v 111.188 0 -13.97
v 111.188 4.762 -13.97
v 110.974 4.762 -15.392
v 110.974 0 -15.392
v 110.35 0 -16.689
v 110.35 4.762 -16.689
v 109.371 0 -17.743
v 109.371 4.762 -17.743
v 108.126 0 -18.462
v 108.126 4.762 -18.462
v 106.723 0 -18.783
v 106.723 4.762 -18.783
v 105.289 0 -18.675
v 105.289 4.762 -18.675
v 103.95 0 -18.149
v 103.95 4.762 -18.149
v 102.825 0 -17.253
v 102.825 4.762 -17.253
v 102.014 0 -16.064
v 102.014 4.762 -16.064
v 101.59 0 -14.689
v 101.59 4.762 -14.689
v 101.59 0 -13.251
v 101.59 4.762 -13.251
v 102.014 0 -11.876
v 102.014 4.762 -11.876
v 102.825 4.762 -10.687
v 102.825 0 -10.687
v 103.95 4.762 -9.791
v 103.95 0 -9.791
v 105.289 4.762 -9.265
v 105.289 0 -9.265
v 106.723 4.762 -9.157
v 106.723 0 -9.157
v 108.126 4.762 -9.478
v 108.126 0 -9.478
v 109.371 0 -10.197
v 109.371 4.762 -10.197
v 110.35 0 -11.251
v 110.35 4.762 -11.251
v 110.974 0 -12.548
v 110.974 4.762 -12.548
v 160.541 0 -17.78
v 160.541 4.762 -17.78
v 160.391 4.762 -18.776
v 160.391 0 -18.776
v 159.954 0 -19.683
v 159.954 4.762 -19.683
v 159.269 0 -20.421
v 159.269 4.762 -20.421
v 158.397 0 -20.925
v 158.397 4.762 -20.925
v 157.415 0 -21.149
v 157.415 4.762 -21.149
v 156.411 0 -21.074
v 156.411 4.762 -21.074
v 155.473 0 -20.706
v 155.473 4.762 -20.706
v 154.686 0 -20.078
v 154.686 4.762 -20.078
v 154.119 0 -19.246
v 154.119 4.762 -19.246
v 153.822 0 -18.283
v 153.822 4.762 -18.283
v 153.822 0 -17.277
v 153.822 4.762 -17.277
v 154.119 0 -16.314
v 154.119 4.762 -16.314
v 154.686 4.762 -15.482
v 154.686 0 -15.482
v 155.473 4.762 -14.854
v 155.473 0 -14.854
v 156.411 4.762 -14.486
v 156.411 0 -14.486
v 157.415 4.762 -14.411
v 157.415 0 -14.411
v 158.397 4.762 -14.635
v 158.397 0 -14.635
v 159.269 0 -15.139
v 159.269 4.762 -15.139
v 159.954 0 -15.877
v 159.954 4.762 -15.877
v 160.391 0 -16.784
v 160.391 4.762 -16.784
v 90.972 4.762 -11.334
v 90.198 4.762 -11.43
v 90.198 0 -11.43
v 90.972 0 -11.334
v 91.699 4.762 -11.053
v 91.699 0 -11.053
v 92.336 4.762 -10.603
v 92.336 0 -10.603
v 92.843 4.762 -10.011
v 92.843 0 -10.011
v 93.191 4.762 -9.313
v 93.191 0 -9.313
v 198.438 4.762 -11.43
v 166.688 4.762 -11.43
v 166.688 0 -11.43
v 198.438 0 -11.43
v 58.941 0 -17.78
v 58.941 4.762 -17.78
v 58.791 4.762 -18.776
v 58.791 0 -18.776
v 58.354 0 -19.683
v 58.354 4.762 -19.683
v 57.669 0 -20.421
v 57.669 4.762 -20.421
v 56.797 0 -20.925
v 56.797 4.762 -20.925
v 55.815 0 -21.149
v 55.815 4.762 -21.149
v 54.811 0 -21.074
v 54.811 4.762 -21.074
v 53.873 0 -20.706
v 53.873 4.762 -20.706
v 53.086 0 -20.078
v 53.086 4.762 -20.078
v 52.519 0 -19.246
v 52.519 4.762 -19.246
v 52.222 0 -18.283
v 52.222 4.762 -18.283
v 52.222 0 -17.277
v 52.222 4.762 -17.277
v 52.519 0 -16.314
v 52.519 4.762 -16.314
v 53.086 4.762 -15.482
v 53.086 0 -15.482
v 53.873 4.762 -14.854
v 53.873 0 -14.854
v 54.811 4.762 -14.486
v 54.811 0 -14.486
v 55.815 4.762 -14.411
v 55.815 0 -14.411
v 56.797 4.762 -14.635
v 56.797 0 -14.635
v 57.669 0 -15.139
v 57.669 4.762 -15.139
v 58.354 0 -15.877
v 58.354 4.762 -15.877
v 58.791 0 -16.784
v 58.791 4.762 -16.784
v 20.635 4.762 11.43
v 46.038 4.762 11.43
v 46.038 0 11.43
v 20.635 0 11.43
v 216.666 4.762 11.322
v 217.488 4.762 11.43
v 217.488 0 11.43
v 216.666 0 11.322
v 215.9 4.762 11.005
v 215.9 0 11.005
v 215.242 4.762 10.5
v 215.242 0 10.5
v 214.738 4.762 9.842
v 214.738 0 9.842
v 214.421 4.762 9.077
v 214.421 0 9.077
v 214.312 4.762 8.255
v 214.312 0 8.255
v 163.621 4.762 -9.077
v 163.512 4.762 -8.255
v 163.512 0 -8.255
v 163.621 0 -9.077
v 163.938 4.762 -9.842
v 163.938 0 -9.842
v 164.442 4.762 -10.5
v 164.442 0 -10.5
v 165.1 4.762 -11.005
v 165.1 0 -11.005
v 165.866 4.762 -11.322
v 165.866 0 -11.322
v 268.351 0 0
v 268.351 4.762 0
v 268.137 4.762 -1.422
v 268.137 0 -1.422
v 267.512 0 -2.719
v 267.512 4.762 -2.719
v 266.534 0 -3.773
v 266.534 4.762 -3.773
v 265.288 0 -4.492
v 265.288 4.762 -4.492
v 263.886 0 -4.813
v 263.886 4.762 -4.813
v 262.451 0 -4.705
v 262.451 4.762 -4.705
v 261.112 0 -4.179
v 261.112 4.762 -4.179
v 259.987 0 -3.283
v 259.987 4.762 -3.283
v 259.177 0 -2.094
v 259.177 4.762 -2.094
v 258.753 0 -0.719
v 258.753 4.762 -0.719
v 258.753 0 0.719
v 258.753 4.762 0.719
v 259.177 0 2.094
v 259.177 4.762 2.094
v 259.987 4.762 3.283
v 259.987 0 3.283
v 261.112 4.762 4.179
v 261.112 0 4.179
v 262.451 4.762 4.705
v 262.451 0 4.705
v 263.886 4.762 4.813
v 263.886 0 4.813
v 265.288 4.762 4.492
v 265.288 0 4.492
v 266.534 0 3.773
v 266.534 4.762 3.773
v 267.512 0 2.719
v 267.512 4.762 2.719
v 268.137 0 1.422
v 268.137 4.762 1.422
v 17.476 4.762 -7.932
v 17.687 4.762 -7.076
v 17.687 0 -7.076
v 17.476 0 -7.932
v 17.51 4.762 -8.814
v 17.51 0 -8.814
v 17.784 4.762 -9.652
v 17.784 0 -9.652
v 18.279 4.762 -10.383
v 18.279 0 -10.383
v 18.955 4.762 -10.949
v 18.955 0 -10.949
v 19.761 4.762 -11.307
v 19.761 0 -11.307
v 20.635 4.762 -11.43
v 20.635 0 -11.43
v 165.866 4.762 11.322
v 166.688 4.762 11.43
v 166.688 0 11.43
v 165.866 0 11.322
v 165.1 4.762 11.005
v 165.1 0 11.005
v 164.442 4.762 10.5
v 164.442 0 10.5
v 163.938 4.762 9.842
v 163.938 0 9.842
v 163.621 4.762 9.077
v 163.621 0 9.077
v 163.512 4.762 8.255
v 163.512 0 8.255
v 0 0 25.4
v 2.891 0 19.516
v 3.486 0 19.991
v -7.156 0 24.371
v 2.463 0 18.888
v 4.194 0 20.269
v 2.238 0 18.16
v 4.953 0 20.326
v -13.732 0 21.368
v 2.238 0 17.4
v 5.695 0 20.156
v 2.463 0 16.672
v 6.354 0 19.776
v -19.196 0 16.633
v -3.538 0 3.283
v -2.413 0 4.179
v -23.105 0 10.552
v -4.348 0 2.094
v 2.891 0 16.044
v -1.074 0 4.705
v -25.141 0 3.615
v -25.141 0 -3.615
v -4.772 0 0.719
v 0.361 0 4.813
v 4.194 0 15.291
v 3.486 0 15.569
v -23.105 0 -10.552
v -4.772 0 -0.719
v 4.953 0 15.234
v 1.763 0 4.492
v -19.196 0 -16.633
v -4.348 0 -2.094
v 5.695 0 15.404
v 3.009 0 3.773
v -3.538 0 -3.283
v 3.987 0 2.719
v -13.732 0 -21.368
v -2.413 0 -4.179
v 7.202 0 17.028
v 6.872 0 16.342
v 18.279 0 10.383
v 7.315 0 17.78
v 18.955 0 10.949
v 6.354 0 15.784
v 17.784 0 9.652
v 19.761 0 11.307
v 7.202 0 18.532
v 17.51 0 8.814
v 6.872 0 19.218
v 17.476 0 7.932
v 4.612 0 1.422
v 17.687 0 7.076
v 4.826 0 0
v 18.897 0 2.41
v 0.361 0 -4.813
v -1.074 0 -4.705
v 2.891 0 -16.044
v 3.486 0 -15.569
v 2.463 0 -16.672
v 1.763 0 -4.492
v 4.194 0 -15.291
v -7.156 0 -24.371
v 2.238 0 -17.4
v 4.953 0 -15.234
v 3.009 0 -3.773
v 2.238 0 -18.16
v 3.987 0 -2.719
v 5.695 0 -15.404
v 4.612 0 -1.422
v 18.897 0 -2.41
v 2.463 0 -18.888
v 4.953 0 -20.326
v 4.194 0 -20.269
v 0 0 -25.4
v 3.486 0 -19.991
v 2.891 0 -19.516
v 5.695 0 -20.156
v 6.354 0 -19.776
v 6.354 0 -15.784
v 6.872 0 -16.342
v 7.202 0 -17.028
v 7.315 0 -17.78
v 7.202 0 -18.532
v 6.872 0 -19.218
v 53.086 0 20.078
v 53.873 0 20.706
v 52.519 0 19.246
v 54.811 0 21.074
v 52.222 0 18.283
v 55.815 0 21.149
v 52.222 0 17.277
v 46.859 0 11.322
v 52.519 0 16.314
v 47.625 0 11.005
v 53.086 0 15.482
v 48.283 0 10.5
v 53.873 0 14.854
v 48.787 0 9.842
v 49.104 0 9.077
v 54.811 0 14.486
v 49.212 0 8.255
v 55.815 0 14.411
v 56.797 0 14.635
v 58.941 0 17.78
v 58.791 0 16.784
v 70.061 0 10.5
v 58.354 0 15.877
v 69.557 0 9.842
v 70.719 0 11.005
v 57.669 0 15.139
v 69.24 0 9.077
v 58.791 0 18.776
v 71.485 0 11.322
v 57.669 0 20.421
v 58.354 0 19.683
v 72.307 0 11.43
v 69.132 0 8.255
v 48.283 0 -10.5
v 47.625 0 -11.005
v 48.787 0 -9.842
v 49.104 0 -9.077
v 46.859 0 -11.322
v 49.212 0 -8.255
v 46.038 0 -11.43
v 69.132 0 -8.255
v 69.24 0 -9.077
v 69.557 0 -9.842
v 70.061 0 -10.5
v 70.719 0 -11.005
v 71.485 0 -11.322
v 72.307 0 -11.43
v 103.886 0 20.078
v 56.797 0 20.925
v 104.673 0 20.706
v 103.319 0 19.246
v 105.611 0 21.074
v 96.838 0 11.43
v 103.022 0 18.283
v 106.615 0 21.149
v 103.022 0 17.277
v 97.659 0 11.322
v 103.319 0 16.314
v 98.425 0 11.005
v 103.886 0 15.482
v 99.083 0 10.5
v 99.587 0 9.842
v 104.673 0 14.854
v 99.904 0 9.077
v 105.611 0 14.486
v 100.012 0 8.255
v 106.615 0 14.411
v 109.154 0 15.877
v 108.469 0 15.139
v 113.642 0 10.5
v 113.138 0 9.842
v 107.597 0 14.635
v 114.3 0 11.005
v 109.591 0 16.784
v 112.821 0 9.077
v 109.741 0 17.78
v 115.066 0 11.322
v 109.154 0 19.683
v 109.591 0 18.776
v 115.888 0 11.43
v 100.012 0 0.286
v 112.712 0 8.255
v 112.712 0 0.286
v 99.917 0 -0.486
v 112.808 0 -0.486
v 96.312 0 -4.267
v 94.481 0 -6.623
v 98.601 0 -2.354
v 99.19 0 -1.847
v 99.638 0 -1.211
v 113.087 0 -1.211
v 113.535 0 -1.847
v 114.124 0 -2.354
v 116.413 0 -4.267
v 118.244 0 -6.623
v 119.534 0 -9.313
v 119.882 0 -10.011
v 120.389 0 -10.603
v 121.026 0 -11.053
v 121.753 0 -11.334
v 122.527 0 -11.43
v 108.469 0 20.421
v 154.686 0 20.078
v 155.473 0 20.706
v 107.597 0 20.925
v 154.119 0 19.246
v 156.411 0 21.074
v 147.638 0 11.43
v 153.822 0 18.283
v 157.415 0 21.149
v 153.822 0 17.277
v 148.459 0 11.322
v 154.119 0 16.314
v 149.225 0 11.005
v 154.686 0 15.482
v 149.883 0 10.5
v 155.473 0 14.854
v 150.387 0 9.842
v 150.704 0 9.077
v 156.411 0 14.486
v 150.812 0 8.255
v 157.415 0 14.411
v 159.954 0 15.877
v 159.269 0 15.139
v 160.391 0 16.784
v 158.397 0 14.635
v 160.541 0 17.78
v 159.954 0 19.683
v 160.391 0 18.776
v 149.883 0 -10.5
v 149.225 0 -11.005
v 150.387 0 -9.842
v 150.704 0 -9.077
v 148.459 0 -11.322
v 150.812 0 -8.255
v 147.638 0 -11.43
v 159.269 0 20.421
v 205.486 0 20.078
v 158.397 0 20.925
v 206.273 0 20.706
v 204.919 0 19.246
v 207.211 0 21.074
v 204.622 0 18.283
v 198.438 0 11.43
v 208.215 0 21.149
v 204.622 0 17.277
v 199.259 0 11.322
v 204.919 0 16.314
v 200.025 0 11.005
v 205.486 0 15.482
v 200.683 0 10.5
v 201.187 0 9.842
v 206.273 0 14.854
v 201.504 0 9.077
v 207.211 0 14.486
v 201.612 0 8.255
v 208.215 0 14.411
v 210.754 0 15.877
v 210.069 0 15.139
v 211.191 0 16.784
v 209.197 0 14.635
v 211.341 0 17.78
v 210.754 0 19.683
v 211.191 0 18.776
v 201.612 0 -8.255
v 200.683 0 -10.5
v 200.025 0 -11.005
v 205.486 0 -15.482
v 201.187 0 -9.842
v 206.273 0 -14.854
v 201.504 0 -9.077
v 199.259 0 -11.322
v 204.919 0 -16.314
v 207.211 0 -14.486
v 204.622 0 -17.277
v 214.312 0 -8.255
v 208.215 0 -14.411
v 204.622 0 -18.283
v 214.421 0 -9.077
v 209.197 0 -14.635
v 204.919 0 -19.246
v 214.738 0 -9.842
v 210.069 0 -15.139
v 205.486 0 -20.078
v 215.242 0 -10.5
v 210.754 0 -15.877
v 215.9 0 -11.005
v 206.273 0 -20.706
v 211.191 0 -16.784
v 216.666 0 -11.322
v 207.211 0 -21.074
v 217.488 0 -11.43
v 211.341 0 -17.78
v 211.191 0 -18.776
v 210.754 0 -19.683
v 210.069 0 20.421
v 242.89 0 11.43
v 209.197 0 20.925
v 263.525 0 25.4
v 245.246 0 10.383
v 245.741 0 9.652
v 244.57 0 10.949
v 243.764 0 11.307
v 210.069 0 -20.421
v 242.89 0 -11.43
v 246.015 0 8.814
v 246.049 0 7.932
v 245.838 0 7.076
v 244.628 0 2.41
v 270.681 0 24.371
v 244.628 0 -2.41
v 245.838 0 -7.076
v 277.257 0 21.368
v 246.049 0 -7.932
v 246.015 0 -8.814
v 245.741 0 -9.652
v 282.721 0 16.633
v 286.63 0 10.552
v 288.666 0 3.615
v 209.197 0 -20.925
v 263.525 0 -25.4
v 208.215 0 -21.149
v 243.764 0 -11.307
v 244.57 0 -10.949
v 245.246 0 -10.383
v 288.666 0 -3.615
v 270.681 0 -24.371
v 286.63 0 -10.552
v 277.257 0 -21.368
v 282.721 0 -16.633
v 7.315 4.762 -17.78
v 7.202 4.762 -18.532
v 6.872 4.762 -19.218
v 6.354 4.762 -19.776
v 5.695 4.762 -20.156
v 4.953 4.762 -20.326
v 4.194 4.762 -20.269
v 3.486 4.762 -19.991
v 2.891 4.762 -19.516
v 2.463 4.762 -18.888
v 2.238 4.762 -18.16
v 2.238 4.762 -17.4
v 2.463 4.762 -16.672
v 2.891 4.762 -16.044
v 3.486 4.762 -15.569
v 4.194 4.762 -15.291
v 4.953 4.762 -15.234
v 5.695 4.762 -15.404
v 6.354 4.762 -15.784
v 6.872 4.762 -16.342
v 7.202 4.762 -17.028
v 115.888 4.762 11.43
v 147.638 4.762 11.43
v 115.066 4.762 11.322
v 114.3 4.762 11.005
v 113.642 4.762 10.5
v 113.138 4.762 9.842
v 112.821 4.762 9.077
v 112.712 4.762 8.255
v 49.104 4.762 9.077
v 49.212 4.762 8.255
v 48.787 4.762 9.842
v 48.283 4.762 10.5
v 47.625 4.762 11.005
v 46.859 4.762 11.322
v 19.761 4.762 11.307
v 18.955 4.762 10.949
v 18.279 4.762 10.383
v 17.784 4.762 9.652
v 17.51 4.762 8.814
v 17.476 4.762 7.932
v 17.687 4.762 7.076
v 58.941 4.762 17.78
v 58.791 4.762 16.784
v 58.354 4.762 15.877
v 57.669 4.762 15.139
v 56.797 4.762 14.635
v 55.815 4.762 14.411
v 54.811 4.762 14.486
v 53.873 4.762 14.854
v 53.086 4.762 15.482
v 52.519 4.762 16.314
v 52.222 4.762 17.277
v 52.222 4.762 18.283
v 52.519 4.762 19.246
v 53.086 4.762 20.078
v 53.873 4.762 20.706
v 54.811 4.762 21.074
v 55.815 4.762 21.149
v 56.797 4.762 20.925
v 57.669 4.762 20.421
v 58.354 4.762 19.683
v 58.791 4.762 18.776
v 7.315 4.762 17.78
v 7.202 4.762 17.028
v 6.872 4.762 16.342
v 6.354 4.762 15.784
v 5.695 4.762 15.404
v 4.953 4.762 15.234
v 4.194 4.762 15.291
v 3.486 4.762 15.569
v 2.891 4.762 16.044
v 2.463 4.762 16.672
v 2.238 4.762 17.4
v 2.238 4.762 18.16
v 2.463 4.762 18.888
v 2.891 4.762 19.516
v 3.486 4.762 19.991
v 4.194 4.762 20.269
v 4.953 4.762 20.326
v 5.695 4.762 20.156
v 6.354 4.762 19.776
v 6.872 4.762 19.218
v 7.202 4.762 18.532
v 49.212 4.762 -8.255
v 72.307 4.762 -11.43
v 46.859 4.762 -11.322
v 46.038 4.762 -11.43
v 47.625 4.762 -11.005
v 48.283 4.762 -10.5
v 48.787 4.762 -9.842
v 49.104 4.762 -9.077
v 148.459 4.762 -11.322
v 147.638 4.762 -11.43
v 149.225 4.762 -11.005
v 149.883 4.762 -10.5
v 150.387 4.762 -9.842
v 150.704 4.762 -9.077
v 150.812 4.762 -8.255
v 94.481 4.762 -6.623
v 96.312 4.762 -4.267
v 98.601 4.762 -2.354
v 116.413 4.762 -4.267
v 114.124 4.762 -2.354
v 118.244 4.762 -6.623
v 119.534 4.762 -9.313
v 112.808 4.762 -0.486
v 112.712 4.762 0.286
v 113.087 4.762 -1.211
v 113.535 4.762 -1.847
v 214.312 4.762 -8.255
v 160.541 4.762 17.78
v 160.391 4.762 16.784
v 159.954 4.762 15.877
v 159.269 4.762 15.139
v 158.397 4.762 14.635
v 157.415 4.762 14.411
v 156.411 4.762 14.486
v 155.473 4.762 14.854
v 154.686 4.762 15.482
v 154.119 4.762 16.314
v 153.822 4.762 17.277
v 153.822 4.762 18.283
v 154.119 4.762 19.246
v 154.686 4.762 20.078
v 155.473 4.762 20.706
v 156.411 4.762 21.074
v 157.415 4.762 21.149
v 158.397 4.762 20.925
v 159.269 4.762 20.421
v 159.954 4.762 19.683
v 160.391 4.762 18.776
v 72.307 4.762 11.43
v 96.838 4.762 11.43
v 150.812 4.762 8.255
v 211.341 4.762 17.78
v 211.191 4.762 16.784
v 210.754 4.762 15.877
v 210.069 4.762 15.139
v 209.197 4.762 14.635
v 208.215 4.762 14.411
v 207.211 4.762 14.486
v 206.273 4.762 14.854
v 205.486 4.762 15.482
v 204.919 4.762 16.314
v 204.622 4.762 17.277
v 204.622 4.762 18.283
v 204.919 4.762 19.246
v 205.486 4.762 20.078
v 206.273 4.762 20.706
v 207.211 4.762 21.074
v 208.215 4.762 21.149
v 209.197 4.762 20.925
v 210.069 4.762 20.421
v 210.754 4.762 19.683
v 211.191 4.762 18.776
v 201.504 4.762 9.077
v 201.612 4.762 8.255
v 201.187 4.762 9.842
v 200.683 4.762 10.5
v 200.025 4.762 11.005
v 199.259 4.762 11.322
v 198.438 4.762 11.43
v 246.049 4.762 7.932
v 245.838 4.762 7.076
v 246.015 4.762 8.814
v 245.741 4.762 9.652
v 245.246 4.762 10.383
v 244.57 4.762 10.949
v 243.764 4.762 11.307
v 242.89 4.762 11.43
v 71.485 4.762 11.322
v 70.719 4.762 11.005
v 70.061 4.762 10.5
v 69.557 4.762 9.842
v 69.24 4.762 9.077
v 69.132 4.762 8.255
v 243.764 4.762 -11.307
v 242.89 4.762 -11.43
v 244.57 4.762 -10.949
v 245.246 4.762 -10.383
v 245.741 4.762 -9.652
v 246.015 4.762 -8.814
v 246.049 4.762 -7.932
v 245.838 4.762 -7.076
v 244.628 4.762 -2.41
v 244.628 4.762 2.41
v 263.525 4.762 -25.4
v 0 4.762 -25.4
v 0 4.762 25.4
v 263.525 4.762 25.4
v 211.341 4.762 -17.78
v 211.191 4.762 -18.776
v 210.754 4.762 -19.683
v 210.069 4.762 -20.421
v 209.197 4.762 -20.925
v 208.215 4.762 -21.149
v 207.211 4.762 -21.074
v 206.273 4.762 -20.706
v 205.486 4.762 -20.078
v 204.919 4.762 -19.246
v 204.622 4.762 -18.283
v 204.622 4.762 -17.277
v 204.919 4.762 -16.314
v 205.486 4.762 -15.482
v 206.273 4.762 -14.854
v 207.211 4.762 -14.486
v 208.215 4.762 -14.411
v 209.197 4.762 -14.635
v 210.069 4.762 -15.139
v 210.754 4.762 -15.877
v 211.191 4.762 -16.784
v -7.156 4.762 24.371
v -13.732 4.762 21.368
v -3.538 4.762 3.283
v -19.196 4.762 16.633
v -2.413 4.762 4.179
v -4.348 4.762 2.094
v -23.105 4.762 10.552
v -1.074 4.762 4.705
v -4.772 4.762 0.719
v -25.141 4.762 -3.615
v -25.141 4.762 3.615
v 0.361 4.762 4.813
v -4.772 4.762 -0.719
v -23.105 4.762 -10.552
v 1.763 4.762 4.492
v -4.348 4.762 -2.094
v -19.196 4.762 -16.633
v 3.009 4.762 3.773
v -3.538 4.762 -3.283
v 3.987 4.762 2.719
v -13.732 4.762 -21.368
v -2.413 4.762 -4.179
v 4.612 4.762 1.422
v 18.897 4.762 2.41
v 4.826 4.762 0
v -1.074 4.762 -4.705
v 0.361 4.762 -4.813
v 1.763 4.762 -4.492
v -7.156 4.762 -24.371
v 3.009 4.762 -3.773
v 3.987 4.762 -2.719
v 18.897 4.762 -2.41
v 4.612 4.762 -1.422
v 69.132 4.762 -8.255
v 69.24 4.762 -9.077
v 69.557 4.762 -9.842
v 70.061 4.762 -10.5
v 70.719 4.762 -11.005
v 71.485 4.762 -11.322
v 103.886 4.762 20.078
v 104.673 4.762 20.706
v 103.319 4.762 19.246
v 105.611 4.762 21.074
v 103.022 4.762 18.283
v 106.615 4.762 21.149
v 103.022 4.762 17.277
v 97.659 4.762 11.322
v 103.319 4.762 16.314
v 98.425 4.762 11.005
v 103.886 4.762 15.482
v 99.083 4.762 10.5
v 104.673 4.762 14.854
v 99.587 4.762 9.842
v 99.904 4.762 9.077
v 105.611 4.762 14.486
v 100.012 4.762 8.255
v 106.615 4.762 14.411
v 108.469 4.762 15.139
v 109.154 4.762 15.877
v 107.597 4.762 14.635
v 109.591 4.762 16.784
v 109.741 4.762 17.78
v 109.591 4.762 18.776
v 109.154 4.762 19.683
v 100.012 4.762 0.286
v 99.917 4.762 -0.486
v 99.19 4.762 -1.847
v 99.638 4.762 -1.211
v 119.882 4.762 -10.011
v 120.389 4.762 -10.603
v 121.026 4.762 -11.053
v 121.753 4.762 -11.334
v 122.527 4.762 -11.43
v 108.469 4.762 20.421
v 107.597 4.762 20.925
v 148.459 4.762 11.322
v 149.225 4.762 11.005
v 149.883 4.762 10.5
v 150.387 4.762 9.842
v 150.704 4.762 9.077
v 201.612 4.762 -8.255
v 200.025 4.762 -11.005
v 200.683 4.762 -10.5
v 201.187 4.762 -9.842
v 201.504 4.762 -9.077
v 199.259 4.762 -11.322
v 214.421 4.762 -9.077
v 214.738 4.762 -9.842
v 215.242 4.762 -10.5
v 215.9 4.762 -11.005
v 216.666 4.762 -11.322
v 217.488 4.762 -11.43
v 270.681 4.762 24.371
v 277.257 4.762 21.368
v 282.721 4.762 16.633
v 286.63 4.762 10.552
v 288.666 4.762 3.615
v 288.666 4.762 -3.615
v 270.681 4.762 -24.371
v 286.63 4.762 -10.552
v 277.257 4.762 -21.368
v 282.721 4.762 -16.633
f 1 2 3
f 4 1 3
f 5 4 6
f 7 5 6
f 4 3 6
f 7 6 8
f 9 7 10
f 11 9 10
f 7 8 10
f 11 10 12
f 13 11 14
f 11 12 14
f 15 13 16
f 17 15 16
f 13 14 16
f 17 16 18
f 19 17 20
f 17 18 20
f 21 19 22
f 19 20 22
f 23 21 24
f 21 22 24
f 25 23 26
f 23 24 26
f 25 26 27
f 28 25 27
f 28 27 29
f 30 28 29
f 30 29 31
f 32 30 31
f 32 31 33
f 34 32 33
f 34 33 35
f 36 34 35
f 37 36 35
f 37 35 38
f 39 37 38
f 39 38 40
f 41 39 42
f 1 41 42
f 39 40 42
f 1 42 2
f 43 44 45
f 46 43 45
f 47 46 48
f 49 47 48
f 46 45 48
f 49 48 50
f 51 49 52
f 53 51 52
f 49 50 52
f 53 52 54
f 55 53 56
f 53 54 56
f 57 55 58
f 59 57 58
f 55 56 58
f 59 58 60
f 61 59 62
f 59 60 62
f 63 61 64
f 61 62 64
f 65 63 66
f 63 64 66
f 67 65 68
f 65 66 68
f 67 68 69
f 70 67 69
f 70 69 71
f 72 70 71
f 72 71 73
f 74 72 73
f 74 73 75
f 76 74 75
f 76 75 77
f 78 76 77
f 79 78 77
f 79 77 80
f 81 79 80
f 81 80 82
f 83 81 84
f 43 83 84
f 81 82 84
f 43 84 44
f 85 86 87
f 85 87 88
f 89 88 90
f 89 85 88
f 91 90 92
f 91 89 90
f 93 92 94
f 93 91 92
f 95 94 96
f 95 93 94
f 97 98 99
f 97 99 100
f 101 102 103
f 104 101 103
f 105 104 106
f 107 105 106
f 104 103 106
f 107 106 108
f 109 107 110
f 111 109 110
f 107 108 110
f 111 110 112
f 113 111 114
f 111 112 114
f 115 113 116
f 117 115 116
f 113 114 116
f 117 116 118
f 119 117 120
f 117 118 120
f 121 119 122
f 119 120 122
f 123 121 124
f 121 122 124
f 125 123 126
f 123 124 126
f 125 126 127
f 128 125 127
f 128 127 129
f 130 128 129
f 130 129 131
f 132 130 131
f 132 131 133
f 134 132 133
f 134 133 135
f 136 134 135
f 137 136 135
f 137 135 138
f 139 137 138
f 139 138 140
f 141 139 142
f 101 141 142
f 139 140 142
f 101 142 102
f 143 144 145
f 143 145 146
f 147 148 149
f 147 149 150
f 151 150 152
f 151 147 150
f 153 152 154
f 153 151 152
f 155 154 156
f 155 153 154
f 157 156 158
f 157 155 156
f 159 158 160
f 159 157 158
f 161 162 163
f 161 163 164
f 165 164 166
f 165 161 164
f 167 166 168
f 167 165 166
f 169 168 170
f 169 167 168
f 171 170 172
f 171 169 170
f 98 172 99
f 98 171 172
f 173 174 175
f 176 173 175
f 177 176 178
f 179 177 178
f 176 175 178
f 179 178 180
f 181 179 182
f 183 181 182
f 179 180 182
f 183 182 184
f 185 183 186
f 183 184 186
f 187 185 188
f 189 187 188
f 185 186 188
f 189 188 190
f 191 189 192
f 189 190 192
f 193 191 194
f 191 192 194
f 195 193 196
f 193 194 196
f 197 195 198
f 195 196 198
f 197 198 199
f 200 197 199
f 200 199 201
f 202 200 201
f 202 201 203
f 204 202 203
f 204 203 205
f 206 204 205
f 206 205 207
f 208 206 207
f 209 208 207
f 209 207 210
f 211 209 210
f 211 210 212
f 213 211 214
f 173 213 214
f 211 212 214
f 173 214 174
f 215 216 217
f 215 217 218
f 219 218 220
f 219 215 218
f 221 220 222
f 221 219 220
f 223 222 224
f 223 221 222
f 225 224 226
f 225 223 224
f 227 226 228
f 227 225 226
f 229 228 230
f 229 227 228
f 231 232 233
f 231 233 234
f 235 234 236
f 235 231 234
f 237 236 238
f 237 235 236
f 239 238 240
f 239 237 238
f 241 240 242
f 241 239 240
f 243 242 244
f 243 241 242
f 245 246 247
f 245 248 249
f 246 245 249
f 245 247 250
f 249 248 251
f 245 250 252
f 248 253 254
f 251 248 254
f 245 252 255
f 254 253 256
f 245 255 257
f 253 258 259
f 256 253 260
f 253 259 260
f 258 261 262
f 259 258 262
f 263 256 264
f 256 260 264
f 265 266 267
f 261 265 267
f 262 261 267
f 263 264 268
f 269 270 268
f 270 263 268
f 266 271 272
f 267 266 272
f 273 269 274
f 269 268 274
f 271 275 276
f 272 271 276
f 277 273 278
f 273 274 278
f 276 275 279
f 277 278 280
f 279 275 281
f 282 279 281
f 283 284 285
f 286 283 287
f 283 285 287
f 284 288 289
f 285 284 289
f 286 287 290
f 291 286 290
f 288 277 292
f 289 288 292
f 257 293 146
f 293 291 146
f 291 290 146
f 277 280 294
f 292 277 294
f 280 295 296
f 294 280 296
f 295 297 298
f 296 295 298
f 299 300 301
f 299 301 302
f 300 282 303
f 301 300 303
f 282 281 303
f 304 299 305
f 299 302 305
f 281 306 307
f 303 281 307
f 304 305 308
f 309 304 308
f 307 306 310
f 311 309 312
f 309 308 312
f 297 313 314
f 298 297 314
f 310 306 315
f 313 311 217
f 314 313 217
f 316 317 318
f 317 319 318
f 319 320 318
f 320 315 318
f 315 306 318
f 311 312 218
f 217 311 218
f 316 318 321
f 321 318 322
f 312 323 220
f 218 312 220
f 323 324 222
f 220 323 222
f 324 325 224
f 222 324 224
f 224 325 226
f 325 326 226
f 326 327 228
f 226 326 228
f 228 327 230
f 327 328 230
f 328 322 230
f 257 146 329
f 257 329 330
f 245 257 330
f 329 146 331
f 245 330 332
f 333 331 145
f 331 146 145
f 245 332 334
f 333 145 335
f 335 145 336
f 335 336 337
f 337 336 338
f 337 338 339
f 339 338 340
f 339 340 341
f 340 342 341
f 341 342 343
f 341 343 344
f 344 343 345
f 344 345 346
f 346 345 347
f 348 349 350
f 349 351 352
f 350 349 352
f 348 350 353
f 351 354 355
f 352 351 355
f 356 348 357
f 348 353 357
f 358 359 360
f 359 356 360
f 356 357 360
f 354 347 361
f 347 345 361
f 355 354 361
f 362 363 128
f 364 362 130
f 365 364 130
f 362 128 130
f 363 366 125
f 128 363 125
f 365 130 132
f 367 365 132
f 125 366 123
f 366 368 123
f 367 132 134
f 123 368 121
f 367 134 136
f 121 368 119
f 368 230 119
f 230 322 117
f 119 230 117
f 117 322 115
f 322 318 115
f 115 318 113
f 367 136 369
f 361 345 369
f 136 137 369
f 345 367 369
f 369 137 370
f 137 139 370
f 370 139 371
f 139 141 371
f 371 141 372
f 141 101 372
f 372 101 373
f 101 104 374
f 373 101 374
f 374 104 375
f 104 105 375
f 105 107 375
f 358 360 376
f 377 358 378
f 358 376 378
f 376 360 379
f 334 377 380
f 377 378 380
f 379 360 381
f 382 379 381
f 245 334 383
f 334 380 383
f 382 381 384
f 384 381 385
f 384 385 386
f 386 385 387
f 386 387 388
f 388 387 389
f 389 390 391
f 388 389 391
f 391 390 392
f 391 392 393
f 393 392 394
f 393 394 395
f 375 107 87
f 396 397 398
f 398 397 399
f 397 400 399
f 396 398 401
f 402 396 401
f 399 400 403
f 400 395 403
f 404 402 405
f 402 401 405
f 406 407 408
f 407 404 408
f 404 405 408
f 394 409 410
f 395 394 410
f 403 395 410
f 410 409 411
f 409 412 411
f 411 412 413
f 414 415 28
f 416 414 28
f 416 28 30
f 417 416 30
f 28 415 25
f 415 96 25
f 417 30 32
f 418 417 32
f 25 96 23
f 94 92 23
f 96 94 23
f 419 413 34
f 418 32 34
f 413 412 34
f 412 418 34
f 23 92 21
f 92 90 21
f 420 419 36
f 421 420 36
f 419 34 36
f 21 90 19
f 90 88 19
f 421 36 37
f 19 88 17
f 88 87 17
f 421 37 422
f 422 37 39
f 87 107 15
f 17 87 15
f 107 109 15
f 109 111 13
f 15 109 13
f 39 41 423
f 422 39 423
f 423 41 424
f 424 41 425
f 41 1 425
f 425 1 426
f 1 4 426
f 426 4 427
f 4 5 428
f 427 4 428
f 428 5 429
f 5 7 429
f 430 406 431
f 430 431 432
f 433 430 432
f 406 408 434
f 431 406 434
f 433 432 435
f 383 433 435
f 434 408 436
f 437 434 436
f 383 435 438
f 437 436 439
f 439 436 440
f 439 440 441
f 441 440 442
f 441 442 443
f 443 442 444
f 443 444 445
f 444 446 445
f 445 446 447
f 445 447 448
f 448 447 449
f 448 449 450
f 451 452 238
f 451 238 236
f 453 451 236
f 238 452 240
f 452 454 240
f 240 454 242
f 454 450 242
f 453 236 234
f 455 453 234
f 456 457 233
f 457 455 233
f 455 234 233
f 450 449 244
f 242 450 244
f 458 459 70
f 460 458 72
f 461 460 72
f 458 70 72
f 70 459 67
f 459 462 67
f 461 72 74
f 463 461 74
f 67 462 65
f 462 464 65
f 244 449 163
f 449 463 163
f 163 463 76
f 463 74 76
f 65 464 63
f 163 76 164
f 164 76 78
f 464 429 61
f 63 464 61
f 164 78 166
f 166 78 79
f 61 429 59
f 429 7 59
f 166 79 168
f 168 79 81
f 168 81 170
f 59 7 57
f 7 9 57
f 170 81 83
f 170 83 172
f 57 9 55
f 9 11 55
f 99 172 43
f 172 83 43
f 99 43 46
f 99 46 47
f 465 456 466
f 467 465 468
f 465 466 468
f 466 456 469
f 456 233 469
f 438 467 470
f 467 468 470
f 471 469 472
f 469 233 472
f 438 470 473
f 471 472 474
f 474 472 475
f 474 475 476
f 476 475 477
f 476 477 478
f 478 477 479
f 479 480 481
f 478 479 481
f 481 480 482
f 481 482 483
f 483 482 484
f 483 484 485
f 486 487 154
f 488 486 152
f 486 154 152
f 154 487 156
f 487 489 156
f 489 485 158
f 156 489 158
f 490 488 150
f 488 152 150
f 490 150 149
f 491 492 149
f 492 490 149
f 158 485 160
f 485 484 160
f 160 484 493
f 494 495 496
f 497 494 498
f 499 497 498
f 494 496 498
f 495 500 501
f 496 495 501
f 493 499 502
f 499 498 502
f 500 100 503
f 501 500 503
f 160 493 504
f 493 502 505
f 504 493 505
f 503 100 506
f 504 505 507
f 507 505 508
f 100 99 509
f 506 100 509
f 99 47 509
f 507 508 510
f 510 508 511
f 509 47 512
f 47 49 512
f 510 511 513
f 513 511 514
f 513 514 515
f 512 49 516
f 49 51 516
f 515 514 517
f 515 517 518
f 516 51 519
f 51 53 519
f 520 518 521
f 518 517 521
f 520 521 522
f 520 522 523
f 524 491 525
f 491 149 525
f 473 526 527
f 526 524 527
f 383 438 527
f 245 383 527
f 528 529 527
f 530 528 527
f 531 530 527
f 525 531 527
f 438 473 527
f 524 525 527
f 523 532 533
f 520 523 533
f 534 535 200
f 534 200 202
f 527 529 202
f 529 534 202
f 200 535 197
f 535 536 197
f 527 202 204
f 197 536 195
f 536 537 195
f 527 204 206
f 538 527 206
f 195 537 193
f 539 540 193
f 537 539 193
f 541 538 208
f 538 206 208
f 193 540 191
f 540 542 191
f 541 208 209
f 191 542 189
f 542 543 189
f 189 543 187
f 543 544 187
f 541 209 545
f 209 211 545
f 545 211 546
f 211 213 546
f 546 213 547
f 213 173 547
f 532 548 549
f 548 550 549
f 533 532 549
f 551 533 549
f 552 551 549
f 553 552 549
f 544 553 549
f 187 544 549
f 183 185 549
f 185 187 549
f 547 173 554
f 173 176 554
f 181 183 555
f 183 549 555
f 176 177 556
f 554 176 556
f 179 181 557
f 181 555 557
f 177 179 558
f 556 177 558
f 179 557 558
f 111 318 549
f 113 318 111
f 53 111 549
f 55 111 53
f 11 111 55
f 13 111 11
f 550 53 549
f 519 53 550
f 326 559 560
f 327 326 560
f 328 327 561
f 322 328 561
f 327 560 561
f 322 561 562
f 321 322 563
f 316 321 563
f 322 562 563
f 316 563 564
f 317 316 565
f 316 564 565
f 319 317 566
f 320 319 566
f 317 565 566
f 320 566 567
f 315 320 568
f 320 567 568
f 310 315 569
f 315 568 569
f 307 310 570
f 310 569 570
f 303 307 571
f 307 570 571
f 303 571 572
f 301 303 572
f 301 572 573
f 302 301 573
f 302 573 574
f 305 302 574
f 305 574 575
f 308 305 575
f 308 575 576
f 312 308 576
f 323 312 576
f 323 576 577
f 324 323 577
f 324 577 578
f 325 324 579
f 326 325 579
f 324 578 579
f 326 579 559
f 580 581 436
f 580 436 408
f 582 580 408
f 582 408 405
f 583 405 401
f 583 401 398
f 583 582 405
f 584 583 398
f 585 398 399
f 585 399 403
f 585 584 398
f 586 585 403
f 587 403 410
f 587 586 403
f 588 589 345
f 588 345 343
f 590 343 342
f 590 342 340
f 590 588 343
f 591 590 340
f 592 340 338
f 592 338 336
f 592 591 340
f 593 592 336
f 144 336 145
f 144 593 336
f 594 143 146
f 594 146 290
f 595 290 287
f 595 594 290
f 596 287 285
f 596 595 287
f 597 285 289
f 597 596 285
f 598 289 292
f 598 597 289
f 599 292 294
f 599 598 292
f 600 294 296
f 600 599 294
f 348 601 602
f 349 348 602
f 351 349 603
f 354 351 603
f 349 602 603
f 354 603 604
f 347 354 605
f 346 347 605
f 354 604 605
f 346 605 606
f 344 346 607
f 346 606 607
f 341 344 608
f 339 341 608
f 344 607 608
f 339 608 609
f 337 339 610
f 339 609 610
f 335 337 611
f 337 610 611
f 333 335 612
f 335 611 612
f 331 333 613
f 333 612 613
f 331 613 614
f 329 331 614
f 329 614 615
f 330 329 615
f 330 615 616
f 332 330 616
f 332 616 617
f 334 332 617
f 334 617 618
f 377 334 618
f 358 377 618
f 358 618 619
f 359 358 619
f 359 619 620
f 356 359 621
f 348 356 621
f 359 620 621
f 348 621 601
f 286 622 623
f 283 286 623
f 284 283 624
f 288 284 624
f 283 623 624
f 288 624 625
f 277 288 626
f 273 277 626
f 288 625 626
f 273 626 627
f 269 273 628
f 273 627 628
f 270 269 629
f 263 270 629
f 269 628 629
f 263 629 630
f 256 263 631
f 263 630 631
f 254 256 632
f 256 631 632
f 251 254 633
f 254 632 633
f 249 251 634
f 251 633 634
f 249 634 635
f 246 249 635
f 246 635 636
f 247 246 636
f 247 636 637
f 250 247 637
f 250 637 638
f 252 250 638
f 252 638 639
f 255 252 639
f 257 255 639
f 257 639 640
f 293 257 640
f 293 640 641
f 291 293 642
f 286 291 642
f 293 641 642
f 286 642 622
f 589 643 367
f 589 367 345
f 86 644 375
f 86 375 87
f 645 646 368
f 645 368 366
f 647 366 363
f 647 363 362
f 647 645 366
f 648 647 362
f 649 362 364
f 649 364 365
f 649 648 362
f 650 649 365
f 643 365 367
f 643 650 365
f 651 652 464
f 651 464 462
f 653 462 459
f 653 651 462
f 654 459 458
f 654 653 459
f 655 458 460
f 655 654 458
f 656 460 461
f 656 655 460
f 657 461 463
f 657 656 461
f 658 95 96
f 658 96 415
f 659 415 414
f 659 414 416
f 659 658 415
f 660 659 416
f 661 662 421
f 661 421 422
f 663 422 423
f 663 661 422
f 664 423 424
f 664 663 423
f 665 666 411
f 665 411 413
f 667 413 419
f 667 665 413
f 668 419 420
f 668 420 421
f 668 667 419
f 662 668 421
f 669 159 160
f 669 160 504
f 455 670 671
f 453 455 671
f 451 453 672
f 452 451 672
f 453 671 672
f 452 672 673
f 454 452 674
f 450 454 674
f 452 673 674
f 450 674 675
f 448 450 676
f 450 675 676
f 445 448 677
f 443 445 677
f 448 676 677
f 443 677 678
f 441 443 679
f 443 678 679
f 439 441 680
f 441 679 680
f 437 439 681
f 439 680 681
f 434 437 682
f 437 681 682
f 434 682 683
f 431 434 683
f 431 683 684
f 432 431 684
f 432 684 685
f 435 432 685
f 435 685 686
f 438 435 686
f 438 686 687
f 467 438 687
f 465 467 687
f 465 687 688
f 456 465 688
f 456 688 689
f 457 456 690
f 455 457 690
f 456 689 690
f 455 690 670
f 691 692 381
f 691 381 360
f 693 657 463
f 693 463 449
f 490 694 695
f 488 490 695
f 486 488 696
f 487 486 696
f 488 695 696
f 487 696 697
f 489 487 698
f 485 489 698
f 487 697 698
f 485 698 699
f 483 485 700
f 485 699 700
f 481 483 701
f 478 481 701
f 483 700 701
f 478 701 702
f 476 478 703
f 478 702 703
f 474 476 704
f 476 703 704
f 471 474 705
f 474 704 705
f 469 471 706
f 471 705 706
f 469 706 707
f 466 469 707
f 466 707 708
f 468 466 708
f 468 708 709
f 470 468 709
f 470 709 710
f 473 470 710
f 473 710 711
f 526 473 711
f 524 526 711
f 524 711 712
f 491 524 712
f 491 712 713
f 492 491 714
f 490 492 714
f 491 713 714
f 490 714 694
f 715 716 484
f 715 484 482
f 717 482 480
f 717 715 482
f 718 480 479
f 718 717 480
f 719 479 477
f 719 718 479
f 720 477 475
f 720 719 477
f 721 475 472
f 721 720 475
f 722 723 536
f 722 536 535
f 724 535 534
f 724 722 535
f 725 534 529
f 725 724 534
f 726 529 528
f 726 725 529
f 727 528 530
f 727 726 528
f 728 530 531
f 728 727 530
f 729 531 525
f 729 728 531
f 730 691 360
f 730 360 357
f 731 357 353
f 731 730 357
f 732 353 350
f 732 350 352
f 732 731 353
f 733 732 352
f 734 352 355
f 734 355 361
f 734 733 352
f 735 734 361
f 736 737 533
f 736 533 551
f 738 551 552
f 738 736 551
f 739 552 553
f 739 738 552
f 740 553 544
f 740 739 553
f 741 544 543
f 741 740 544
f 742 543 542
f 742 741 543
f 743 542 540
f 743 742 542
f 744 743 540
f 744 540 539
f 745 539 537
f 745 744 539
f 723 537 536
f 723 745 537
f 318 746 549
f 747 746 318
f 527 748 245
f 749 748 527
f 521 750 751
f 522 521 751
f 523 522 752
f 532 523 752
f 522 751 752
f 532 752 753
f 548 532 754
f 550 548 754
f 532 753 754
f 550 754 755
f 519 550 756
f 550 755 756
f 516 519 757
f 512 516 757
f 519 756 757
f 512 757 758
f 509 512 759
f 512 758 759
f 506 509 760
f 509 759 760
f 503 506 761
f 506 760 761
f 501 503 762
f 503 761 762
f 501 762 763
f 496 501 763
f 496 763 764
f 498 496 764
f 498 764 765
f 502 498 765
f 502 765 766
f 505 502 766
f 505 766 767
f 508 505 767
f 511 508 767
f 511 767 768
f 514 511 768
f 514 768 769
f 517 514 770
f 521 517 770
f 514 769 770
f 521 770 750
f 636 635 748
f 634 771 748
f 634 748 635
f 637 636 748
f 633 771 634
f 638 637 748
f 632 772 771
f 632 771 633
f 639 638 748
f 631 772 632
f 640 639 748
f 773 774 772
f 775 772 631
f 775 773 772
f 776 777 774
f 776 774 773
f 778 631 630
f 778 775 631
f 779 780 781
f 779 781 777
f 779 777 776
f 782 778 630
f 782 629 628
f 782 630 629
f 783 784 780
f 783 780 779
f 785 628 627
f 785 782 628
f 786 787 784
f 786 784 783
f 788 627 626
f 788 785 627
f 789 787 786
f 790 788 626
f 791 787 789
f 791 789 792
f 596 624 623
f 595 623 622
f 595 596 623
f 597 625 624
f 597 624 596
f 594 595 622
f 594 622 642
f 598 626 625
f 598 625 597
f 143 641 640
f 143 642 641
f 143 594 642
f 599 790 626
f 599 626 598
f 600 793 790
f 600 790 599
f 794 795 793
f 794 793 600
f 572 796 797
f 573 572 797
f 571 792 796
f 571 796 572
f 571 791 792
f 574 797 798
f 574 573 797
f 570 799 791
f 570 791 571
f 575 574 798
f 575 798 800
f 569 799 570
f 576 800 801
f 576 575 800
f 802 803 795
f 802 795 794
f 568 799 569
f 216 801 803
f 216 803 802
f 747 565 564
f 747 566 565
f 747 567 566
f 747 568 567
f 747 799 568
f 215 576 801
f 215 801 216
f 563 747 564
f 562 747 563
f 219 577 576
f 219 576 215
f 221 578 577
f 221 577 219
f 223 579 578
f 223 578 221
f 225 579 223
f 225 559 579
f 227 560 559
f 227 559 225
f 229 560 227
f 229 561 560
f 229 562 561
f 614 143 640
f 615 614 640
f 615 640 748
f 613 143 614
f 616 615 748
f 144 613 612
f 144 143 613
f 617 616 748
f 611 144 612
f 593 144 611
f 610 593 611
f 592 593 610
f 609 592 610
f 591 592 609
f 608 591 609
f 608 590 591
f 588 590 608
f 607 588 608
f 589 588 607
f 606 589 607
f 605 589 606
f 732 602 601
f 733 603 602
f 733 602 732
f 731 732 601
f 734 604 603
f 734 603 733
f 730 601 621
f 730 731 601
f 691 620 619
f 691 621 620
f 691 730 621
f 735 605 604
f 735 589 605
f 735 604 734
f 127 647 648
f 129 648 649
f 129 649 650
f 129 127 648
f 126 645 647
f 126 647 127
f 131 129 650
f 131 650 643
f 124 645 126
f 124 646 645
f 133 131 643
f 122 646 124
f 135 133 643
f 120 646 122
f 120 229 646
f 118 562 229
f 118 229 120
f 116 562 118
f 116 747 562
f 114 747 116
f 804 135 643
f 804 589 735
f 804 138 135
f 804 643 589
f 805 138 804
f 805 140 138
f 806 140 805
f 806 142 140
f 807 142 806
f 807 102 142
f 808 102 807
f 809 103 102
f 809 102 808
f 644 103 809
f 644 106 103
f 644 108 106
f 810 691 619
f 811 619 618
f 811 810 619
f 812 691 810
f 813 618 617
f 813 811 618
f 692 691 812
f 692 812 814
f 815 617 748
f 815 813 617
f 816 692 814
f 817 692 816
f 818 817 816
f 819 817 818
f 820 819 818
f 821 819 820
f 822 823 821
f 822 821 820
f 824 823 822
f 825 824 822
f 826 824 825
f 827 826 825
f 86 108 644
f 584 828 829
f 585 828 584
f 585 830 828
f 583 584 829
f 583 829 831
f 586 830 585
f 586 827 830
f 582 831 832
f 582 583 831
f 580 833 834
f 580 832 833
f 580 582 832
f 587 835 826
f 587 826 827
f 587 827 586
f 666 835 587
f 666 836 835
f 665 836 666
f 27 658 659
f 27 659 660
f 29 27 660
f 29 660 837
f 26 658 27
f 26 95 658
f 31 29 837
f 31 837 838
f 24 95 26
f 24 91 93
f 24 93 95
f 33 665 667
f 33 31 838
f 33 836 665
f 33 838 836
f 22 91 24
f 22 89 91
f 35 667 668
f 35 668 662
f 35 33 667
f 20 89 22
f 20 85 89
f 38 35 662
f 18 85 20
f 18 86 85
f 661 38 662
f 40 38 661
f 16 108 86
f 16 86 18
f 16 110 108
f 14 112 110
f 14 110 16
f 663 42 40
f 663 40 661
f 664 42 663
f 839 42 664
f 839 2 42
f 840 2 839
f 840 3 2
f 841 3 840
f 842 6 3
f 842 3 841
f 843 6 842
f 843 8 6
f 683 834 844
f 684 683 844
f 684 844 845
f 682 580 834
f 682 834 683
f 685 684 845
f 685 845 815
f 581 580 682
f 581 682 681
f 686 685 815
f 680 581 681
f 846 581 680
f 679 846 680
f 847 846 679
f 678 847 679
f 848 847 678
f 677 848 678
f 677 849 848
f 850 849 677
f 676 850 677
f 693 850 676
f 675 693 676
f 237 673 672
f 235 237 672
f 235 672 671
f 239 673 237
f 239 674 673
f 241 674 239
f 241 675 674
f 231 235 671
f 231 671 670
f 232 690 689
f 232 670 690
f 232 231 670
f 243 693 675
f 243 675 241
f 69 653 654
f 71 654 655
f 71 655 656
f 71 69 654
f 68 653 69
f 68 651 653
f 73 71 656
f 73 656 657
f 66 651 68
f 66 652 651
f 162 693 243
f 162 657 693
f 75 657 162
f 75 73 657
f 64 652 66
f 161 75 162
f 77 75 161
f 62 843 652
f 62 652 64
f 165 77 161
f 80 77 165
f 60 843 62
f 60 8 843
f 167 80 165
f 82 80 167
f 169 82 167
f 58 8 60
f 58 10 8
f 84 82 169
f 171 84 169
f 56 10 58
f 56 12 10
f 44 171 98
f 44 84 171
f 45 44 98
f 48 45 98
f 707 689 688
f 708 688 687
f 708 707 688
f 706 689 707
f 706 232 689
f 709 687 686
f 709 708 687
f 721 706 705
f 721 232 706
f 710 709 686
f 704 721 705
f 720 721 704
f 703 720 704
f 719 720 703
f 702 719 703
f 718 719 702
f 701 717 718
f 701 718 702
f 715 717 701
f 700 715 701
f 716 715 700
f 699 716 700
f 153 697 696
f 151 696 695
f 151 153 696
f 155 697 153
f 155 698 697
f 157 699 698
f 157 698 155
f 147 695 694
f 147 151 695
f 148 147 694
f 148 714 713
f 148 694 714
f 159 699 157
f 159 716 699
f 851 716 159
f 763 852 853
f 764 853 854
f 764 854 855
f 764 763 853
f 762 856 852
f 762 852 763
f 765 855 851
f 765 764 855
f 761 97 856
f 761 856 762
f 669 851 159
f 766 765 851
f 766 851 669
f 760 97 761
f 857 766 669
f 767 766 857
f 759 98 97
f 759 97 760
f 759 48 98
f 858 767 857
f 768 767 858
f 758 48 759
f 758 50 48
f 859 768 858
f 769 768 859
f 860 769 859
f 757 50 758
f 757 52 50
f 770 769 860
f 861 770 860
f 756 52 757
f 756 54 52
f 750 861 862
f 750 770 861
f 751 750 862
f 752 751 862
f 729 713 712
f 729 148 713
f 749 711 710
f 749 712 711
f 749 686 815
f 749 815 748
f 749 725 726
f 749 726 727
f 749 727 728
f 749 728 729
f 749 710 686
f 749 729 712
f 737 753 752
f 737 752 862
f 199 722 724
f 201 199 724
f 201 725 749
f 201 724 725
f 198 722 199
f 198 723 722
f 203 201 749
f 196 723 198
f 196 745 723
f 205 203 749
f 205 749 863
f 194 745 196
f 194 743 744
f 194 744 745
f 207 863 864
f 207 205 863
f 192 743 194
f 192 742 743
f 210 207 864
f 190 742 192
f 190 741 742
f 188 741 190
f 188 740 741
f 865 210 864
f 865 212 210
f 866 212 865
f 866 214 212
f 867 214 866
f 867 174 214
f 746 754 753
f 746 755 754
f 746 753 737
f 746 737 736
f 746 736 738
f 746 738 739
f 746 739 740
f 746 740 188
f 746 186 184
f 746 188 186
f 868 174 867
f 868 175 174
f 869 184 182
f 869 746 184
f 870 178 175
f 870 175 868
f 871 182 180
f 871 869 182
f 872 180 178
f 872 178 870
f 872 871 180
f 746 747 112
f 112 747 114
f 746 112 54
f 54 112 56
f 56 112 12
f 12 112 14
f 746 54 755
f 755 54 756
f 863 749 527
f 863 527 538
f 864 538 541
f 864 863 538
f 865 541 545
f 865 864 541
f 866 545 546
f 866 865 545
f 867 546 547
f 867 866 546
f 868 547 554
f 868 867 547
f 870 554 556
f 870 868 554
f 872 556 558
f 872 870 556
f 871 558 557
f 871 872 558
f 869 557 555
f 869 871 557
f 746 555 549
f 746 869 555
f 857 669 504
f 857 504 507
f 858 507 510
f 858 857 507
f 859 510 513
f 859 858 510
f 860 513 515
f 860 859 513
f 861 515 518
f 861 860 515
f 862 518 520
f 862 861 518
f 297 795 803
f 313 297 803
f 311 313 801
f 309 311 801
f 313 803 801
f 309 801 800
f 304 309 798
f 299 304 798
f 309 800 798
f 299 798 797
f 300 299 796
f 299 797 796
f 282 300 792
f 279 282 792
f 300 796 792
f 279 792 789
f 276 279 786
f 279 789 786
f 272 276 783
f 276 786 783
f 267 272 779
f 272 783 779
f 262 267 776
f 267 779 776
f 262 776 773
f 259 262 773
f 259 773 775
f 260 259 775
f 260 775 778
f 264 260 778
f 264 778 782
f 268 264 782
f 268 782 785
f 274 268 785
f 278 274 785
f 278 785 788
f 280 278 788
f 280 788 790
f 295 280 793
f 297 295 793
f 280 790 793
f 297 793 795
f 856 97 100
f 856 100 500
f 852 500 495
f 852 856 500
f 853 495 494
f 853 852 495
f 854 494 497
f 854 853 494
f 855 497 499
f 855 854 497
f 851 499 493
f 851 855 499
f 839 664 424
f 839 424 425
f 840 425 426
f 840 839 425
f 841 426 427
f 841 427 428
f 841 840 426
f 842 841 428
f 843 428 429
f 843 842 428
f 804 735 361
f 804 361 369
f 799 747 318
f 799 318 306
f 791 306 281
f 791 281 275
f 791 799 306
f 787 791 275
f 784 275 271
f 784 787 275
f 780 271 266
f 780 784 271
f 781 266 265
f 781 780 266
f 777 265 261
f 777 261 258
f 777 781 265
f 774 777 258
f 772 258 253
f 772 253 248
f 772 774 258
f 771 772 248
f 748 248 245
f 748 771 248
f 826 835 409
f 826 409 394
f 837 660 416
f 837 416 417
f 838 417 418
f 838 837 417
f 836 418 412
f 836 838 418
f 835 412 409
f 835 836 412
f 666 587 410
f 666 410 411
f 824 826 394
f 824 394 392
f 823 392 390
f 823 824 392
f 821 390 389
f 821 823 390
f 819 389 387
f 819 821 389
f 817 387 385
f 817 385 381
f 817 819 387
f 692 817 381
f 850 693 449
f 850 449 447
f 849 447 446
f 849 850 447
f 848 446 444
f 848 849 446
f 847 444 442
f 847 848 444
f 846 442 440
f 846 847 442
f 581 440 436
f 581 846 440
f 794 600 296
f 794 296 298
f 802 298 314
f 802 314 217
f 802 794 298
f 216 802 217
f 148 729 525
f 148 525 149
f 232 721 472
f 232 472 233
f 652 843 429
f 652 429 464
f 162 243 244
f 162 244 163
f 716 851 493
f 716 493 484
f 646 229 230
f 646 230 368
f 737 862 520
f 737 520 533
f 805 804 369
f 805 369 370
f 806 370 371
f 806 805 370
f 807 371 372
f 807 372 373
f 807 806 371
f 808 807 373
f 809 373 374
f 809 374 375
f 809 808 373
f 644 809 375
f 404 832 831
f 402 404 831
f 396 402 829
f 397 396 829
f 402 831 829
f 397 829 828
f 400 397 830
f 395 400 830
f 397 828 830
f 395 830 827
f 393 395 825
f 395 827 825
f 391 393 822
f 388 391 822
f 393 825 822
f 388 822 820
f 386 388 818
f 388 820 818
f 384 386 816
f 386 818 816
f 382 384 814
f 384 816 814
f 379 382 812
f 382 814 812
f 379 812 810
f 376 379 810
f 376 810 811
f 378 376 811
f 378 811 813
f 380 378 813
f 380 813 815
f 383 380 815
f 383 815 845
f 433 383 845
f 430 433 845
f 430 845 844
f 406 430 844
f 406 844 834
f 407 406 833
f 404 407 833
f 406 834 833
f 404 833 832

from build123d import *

# Parameters (mm, degrees)
SKETCH1_R           = 4.826
SKETCH1_R_2         = 3.3782
SKETCH1_R_3         = 2.5527
BOSS_EXTRUDE1_DEPTH = 4.7625


with BuildPart() as part:
    # Sketch1 → Boss-Extrude1 (new body)
    with BuildSketch(Plane(origin=(0, 4.7625, 0), x_dir=(1, 0, 0), z_dir=(0, 1, 0))):
        with BuildLine():
            Line((263.525, 25.4), (0, 25.4))
            ThreePointArc((0, 25.4), (-25.4, 0), (0, -25.4))
            Line((0, -25.4), (263.525, -25.4))
            ThreePointArc((263.525, -25.4), (288.925, 0), (263.525, 25.4))
        make_face()
        Circle(SKETCH1_R, mode=Mode.SUBTRACT)
        with Locations((263.525, 0)):
            Circle(SKETCH1_R, mode=Mode.SUBTRACT)
        with Locations((55.5625, -17.78)):
            Circle(SKETCH1_R_2, mode=Mode.SUBTRACT)
        with Locations((4.7625, -17.78)):
            Circle(SKETCH1_R_3, mode=Mode.SUBTRACT)
        with Locations((207.9625, 17.78)):
            Circle(SKETCH1_R_2, mode=Mode.SUBTRACT)
        with Locations((106.3625, -17.78)):
            Circle(SKETCH1_R_2, mode=Mode.SUBTRACT)
        with Locations((157.1625, -17.78)):
            Circle(SKETCH1_R_2, mode=Mode.SUBTRACT)
        with Locations((207.9625, -17.78)):
            Circle(SKETCH1_R_2, mode=Mode.SUBTRACT)
        with Locations((157.1625, 17.78)):
            Circle(SKETCH1_R_2, mode=Mode.SUBTRACT)
        with Locations((4.7625, 17.78)):
            Circle(SKETCH1_R_3, mode=Mode.SUBTRACT)
        with Locations((55.5625, 17.78)):
            Circle(SKETCH1_R_2, mode=Mode.SUBTRACT)
        with Locations((106.3625, 13.97)):
            Circle(SKETCH1_R, mode=Mode.SUBTRACT)
        with BuildLine():
            Line((166.6875, 11.43), (198.4375, 11.43))
            ThreePointArc((198.4375, 11.43), (200.68256403, 10.50006403), (201.6125, 8.255))
            Line((201.6125, 8.255), (201.6125, -8.255))
            ThreePointArc((201.6125, -8.255), (200.68256403, -10.50006403), (198.4375, -11.43))
            Line((198.4375, -11.43), (166.6875, -11.43))
            ThreePointArc((166.6875, -11.43), (164.44243597, -10.50006403), (163.5125, -8.255))
            Line((163.5125, -8.255), (163.5125, 8.255))
            ThreePointArc((163.5125, 8.255), (164.44243597, 10.50006403), (166.6875, 11.43))
        make_face(mode=Mode.SUBTRACT)
        with BuildLine():
            Line((122.526961018, 11.43), (147.6375, 11.43))
            ThreePointArc((147.6375, 11.43), (149.88256403, 10.50006403), (150.8125, 8.255))
            Line((150.8125, 8.255), (150.8125, -8.255))
            ThreePointArc((150.8125, -8.255), (149.88256403, -10.50006403), (147.6375, -11.43))
            Line((147.6375, -11.43), (115.8875, -11.43))
            ThreePointArc((115.8875, -11.43), (113.64243597, -10.50006403), (112.7125, -8.255))
            Line((112.7125, -8.255), (112.7125, -0.285714644))
            ThreePointArc((112.7125, -0.285714644), (113.087413196, 1.21099471), (114.123611111, 2.354232513))
            ThreePointArc((114.123611111, 2.354232513), (117.391826035, 5.39591887), (119.533542311, 9.313333333))
            ThreePointArc((119.533542311, 9.313333333), (120.693873913, 10.847376644), (122.526961018, 11.43))
        make_face(mode=Mode.SUBTRACT)
        with BuildLine():
            Line((72.306560788, 11.43), (90.198038982, 11.43))
            ThreePointArc((90.198038982, 11.43), (92.031126087, 10.847376644), (93.191457689, 9.313333333))
            ThreePointArc((93.191457689, 9.313333333), (95.333173965, 5.39591887), (98.601388889, 2.354232513))
            ThreePointArc((98.601388889, 2.354232513), (99.637586804, 1.21099471), (100.0125, -0.285714644))
            Line((100.0125, -0.285714644), (100.0125, -8.255))
            ThreePointArc((100.0125, -8.255), (99.08256403, -10.50006403), (96.8375, -11.43))
            Line((96.8375, -11.43), (72.306560788, -11.43))
            ThreePointArc((72.306560788, -11.43), (70.061496758, -10.50006403), (69.131560788, -8.255))
            Line((69.131560788, -8.255), (69.131560788, 8.255))
            ThreePointArc((69.131560788, 8.255), (70.061496758, 10.50006403), (72.306560788, 11.43))
        make_face(mode=Mode.SUBTRACT)
        with BuildLine():
            Line((20.635057548, 11.43), (46.0375, 11.43))
            ThreePointArc((46.0375, 11.43), (48.28256403, 10.50006403), (49.2125, 8.255))
            Line((49.2125, 8.255), (49.2125, -8.255))
            ThreePointArc((49.2125, -8.255), (48.28256403, -10.50006403), (46.0375, -11.43))
            Line((46.0375, -11.43), (20.635057548, -11.43))
            ThreePointArc((20.635057548, -11.43), (18.005907767, -10.034942816), (17.687192184, -7.075714286))
            ThreePointArc((17.687192184, -7.075714286), (19.05, 0), (17.687192184, 7.075714286))
            ThreePointArc((17.687192184, 7.075714286), (18.005907767, 10.034942816), (20.635057548, 11.43))
        make_face(mode=Mode.SUBTRACT)
        with BuildLine():
            Line((242.889942452, -11.43), (217.4875, -11.43))
            ThreePointArc((217.4875, -11.43), (215.24243597, -10.50006403), (214.3125, -8.255))
            Line((214.3125, -8.255), (214.3125, 8.255))
            ThreePointArc((214.3125, 8.255), (215.24243597, 10.50006403), (217.4875, 11.43))
            Line((217.4875, 11.43), (242.889942452, 11.43))
            ThreePointArc((242.889942452, 11.43), (245.519092233, 10.034942816), (245.837807816, 7.075714286))
            ThreePointArc((245.837807816, 7.075714286), (244.475, 0), (245.837807816, -7.075714286))
            ThreePointArc((245.837807816, -7.075714286), (245.519092233, -10.034942816), (242.889942452, -11.43))
        make_face(mode=Mode.SUBTRACT)
    extrude(amount=-BOSS_EXTRUDE1_DEPTH)


solid = part.part
